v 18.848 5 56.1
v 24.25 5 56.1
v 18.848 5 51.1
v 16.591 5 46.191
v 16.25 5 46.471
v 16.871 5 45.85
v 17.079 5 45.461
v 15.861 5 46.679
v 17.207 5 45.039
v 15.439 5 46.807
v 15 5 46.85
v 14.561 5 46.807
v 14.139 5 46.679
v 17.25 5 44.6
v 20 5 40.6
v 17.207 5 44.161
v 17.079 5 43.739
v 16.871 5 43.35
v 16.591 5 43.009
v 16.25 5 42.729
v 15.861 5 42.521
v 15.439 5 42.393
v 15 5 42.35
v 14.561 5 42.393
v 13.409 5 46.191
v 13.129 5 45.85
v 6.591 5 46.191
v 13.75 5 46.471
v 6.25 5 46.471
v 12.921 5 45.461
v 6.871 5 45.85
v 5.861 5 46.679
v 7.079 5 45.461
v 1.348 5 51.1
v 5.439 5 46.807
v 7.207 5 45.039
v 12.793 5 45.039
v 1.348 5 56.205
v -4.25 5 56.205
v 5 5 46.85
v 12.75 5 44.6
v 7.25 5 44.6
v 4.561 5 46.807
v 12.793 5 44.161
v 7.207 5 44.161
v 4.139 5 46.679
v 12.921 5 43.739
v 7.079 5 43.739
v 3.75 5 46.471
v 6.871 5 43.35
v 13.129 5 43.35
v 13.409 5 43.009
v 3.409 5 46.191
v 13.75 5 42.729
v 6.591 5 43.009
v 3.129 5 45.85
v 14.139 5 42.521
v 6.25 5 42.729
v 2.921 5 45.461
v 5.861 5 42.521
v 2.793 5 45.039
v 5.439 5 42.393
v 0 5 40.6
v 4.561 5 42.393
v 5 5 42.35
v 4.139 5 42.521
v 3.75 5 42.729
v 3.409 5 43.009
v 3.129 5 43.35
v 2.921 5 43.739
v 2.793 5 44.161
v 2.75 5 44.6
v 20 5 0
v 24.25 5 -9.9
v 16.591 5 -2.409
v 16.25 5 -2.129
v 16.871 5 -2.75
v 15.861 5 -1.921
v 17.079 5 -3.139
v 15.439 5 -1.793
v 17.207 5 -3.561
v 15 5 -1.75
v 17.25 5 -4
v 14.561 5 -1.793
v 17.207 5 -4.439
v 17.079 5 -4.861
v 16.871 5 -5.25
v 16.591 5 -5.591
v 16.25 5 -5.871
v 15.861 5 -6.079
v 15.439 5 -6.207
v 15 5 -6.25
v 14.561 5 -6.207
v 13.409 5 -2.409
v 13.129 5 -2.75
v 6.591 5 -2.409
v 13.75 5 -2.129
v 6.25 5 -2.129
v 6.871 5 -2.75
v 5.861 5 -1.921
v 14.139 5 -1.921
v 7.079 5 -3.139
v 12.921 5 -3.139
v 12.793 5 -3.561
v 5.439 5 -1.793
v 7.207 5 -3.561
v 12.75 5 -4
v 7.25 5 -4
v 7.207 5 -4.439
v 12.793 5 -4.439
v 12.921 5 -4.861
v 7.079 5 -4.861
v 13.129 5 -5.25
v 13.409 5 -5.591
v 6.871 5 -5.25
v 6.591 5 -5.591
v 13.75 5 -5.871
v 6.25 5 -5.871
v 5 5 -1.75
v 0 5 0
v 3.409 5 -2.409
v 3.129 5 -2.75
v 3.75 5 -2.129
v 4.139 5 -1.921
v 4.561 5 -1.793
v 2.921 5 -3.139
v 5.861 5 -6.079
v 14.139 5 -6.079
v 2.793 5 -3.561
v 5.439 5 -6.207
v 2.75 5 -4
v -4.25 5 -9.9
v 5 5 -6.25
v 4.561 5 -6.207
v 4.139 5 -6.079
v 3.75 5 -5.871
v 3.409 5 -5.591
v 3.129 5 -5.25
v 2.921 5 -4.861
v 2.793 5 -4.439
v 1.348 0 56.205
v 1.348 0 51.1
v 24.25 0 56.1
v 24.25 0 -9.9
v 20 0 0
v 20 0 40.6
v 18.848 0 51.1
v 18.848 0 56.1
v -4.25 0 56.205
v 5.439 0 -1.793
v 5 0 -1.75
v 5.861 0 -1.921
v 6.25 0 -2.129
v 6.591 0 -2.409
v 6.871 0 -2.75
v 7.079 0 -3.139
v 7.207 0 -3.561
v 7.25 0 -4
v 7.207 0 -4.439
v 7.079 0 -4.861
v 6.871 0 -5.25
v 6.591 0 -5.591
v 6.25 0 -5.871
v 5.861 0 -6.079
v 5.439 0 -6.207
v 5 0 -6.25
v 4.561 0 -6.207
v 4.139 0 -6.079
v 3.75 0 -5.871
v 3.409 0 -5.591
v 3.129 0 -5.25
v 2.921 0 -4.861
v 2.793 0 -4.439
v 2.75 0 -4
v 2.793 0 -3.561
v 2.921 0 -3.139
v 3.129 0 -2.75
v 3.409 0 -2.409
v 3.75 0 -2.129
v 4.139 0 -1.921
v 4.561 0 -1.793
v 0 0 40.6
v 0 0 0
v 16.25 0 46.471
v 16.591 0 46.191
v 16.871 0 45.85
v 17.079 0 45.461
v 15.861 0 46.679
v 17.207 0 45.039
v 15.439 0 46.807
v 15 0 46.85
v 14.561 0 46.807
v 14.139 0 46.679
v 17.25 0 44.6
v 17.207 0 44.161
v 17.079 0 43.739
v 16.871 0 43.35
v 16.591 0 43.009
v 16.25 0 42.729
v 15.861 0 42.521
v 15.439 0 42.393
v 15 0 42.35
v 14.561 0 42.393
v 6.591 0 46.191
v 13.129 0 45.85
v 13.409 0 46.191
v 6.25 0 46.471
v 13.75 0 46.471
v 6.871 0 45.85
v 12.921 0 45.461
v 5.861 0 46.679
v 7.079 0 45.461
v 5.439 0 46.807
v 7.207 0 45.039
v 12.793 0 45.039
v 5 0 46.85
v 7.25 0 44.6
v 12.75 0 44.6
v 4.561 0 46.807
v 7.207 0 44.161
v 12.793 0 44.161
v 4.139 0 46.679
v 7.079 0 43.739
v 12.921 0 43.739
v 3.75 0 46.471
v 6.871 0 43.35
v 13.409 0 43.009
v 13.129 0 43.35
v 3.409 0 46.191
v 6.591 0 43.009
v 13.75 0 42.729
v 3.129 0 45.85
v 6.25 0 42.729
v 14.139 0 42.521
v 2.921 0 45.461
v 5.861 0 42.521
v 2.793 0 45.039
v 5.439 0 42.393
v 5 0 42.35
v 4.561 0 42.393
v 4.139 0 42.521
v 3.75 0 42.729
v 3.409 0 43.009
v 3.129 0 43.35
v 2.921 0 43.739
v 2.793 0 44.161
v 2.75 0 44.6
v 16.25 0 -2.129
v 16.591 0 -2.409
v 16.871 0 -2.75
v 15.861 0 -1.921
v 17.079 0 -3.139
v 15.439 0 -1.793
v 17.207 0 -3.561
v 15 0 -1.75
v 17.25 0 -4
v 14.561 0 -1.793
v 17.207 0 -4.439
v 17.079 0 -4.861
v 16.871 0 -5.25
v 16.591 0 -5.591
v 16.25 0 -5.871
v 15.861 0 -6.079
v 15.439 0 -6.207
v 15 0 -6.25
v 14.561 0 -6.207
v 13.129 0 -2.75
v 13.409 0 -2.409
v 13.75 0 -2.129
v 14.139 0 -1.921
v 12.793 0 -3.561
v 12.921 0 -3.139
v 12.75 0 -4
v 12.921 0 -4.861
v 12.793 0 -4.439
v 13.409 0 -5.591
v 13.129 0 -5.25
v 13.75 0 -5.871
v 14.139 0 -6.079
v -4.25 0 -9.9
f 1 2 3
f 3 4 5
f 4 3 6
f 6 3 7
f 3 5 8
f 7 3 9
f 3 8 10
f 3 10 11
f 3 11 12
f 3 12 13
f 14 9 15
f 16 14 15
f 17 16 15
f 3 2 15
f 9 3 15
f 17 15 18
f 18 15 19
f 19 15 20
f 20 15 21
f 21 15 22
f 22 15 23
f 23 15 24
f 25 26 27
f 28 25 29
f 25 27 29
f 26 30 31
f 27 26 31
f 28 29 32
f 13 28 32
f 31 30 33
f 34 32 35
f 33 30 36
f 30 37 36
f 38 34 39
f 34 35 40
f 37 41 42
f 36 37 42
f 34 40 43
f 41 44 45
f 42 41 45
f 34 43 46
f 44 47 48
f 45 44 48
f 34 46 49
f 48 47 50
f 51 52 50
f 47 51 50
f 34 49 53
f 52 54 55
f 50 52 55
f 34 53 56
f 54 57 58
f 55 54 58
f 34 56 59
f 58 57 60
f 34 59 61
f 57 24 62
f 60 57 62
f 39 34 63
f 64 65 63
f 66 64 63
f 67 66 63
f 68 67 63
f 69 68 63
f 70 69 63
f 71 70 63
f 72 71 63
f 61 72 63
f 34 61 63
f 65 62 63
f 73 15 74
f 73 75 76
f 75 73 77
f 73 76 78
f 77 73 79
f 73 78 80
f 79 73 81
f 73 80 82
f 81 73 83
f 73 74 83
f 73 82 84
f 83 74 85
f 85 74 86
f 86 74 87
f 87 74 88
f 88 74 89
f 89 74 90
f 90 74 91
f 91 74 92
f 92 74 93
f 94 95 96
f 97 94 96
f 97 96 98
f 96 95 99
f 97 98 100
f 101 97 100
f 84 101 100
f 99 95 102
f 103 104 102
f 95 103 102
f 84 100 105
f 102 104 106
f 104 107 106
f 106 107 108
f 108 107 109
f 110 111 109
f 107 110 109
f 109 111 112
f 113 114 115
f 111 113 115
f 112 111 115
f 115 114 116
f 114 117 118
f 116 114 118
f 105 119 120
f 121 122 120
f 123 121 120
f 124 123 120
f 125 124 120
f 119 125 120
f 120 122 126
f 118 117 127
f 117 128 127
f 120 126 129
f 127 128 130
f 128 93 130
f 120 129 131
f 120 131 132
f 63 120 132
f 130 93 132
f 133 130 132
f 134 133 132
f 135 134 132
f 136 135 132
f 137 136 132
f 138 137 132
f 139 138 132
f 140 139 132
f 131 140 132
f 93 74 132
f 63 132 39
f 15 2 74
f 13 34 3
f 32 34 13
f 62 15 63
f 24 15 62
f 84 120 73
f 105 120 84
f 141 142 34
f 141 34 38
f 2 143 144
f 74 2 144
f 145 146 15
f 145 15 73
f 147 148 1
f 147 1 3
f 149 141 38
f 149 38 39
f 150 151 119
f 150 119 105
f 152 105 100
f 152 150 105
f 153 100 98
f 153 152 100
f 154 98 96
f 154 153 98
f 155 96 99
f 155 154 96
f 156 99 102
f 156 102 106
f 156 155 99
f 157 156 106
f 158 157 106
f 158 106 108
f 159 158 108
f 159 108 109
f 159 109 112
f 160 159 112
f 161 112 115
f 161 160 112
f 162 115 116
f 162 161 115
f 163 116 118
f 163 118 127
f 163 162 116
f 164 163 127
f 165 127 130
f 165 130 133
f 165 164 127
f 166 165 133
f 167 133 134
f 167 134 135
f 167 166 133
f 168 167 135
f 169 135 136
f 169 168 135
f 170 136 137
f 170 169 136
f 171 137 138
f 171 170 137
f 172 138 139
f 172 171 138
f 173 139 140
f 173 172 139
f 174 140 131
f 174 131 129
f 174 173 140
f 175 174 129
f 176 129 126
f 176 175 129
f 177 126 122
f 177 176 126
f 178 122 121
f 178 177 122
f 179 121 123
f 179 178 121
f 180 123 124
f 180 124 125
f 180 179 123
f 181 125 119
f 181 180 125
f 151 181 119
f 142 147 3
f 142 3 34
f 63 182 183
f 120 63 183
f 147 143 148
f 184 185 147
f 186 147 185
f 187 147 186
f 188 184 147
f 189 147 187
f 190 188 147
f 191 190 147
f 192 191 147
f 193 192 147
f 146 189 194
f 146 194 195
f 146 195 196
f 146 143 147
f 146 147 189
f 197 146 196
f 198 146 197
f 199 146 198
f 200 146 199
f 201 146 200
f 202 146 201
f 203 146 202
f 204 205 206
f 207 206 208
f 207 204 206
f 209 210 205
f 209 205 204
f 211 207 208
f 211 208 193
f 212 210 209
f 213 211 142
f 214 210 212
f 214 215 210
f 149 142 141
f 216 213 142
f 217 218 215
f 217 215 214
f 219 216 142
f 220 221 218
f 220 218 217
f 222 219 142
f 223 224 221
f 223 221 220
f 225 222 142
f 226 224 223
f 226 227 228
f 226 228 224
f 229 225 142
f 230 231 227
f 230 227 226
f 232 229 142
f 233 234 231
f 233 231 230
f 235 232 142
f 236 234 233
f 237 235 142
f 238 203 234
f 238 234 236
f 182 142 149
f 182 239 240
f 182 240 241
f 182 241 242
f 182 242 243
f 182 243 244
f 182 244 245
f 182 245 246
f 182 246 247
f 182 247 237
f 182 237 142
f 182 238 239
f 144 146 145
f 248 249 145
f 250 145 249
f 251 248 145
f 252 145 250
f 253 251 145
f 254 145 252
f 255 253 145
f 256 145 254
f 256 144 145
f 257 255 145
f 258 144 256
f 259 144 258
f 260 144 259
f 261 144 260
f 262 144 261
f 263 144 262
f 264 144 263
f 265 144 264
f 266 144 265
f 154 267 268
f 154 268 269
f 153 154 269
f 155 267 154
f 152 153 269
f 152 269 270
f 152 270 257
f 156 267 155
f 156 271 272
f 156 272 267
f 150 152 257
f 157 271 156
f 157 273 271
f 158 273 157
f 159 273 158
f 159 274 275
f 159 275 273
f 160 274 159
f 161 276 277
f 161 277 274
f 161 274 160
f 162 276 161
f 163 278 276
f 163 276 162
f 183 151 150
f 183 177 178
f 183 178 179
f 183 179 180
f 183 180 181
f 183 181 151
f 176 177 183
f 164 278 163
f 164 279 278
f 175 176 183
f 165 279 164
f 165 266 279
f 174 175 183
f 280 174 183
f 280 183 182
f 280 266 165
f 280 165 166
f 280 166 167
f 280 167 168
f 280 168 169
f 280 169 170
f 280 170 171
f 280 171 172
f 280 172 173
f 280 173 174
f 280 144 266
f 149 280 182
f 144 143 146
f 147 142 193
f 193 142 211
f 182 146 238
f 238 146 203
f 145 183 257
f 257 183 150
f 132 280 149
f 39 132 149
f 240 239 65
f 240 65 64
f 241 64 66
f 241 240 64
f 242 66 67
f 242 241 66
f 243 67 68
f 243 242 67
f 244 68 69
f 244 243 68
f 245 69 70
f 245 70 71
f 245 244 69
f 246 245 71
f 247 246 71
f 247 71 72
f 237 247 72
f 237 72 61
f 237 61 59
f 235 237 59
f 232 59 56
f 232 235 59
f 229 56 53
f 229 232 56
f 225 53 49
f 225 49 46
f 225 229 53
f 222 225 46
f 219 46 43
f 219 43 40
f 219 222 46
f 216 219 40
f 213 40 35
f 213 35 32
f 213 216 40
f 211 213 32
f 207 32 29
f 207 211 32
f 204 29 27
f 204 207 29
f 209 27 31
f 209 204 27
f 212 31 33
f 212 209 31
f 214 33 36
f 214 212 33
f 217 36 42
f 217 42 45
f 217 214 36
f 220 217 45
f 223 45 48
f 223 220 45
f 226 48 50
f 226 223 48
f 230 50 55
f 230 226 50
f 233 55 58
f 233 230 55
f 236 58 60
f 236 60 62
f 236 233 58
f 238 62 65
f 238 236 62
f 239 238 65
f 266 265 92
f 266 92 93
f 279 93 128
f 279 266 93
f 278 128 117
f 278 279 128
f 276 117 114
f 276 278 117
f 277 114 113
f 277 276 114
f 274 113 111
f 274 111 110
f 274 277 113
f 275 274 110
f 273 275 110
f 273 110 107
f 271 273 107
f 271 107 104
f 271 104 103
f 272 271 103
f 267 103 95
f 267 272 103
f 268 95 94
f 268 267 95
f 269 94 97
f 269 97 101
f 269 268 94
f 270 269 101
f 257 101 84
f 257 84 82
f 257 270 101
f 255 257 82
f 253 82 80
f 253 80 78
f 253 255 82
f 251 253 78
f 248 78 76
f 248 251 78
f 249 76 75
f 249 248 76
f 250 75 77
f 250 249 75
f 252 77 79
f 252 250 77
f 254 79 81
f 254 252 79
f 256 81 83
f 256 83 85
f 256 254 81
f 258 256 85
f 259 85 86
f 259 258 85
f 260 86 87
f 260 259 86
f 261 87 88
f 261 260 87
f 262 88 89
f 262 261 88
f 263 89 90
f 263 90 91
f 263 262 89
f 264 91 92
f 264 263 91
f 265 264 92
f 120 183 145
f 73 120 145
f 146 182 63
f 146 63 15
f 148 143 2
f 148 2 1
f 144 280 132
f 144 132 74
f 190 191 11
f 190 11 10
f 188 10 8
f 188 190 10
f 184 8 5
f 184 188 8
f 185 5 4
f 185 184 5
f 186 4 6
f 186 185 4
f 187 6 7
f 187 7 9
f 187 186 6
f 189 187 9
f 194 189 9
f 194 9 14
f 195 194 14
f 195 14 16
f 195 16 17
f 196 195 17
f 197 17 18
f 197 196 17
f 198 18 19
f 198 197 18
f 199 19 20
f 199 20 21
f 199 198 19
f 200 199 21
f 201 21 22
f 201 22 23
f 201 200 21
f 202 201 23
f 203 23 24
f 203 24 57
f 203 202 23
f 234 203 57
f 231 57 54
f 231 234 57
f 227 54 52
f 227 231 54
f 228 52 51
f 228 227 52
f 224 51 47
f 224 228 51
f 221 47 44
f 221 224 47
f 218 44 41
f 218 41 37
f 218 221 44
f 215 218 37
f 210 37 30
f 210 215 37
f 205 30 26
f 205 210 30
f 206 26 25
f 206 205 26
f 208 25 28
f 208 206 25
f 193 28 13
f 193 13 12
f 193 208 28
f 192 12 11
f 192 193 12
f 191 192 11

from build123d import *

# Parameters (mm, degrees)
SKETCH1_R           = 2.25
SKETCH1_W           = 20
SKETCH1_H           = 40.6
BOSS_EXTRUDE1_DEPTH = 5


with BuildPart() as part:
    # Sketch1 → Boss-Extrude1 (new body)
    with BuildSketch(Plane(origin=(0, 0, 0), x_dir=(1, 0, 0), z_dir=(0, 1, 0))):
        Polygon((-4.25, -48), (-4.25, 7.4), (-4.25, 9.9), (24.25, 9.9), (24.25, 7.4), (24.25, -48), (24.25, -56.1), (18.848117926, -56.1), (18.848117926, -51.1), (1.348117926, -51.1), (1.348117926, -56.204802146), (-4.25, -56.204802146), align=None)
        with Locations(Location((5, 4, 0), (0, 0, 270))):
            Circle(SKETCH1_R, mode=Mode.SUBTRACT)
        with Locations(Location((15, 4, 0), (0, 0, 90))):
            Circle(SKETCH1_R, mode=Mode.SUBTRACT)
        with Locations(Location((5, -44.6, 0), (0, 0, 90))):
            Circle(SKETCH1_R, mode=Mode.SUBTRACT)
        with Locations(Location((15, -44.6, 0), (0, 0, 270))):
            Circle(SKETCH1_R, mode=Mode.SUBTRACT)
        with Locations((10, -20.3)):
            Rectangle(SKETCH1_W, SKETCH1_H, mode=Mode.SUBTRACT)
    extrude(amount=BOSS_EXTRUDE1_DEPTH)


solid = part.part
